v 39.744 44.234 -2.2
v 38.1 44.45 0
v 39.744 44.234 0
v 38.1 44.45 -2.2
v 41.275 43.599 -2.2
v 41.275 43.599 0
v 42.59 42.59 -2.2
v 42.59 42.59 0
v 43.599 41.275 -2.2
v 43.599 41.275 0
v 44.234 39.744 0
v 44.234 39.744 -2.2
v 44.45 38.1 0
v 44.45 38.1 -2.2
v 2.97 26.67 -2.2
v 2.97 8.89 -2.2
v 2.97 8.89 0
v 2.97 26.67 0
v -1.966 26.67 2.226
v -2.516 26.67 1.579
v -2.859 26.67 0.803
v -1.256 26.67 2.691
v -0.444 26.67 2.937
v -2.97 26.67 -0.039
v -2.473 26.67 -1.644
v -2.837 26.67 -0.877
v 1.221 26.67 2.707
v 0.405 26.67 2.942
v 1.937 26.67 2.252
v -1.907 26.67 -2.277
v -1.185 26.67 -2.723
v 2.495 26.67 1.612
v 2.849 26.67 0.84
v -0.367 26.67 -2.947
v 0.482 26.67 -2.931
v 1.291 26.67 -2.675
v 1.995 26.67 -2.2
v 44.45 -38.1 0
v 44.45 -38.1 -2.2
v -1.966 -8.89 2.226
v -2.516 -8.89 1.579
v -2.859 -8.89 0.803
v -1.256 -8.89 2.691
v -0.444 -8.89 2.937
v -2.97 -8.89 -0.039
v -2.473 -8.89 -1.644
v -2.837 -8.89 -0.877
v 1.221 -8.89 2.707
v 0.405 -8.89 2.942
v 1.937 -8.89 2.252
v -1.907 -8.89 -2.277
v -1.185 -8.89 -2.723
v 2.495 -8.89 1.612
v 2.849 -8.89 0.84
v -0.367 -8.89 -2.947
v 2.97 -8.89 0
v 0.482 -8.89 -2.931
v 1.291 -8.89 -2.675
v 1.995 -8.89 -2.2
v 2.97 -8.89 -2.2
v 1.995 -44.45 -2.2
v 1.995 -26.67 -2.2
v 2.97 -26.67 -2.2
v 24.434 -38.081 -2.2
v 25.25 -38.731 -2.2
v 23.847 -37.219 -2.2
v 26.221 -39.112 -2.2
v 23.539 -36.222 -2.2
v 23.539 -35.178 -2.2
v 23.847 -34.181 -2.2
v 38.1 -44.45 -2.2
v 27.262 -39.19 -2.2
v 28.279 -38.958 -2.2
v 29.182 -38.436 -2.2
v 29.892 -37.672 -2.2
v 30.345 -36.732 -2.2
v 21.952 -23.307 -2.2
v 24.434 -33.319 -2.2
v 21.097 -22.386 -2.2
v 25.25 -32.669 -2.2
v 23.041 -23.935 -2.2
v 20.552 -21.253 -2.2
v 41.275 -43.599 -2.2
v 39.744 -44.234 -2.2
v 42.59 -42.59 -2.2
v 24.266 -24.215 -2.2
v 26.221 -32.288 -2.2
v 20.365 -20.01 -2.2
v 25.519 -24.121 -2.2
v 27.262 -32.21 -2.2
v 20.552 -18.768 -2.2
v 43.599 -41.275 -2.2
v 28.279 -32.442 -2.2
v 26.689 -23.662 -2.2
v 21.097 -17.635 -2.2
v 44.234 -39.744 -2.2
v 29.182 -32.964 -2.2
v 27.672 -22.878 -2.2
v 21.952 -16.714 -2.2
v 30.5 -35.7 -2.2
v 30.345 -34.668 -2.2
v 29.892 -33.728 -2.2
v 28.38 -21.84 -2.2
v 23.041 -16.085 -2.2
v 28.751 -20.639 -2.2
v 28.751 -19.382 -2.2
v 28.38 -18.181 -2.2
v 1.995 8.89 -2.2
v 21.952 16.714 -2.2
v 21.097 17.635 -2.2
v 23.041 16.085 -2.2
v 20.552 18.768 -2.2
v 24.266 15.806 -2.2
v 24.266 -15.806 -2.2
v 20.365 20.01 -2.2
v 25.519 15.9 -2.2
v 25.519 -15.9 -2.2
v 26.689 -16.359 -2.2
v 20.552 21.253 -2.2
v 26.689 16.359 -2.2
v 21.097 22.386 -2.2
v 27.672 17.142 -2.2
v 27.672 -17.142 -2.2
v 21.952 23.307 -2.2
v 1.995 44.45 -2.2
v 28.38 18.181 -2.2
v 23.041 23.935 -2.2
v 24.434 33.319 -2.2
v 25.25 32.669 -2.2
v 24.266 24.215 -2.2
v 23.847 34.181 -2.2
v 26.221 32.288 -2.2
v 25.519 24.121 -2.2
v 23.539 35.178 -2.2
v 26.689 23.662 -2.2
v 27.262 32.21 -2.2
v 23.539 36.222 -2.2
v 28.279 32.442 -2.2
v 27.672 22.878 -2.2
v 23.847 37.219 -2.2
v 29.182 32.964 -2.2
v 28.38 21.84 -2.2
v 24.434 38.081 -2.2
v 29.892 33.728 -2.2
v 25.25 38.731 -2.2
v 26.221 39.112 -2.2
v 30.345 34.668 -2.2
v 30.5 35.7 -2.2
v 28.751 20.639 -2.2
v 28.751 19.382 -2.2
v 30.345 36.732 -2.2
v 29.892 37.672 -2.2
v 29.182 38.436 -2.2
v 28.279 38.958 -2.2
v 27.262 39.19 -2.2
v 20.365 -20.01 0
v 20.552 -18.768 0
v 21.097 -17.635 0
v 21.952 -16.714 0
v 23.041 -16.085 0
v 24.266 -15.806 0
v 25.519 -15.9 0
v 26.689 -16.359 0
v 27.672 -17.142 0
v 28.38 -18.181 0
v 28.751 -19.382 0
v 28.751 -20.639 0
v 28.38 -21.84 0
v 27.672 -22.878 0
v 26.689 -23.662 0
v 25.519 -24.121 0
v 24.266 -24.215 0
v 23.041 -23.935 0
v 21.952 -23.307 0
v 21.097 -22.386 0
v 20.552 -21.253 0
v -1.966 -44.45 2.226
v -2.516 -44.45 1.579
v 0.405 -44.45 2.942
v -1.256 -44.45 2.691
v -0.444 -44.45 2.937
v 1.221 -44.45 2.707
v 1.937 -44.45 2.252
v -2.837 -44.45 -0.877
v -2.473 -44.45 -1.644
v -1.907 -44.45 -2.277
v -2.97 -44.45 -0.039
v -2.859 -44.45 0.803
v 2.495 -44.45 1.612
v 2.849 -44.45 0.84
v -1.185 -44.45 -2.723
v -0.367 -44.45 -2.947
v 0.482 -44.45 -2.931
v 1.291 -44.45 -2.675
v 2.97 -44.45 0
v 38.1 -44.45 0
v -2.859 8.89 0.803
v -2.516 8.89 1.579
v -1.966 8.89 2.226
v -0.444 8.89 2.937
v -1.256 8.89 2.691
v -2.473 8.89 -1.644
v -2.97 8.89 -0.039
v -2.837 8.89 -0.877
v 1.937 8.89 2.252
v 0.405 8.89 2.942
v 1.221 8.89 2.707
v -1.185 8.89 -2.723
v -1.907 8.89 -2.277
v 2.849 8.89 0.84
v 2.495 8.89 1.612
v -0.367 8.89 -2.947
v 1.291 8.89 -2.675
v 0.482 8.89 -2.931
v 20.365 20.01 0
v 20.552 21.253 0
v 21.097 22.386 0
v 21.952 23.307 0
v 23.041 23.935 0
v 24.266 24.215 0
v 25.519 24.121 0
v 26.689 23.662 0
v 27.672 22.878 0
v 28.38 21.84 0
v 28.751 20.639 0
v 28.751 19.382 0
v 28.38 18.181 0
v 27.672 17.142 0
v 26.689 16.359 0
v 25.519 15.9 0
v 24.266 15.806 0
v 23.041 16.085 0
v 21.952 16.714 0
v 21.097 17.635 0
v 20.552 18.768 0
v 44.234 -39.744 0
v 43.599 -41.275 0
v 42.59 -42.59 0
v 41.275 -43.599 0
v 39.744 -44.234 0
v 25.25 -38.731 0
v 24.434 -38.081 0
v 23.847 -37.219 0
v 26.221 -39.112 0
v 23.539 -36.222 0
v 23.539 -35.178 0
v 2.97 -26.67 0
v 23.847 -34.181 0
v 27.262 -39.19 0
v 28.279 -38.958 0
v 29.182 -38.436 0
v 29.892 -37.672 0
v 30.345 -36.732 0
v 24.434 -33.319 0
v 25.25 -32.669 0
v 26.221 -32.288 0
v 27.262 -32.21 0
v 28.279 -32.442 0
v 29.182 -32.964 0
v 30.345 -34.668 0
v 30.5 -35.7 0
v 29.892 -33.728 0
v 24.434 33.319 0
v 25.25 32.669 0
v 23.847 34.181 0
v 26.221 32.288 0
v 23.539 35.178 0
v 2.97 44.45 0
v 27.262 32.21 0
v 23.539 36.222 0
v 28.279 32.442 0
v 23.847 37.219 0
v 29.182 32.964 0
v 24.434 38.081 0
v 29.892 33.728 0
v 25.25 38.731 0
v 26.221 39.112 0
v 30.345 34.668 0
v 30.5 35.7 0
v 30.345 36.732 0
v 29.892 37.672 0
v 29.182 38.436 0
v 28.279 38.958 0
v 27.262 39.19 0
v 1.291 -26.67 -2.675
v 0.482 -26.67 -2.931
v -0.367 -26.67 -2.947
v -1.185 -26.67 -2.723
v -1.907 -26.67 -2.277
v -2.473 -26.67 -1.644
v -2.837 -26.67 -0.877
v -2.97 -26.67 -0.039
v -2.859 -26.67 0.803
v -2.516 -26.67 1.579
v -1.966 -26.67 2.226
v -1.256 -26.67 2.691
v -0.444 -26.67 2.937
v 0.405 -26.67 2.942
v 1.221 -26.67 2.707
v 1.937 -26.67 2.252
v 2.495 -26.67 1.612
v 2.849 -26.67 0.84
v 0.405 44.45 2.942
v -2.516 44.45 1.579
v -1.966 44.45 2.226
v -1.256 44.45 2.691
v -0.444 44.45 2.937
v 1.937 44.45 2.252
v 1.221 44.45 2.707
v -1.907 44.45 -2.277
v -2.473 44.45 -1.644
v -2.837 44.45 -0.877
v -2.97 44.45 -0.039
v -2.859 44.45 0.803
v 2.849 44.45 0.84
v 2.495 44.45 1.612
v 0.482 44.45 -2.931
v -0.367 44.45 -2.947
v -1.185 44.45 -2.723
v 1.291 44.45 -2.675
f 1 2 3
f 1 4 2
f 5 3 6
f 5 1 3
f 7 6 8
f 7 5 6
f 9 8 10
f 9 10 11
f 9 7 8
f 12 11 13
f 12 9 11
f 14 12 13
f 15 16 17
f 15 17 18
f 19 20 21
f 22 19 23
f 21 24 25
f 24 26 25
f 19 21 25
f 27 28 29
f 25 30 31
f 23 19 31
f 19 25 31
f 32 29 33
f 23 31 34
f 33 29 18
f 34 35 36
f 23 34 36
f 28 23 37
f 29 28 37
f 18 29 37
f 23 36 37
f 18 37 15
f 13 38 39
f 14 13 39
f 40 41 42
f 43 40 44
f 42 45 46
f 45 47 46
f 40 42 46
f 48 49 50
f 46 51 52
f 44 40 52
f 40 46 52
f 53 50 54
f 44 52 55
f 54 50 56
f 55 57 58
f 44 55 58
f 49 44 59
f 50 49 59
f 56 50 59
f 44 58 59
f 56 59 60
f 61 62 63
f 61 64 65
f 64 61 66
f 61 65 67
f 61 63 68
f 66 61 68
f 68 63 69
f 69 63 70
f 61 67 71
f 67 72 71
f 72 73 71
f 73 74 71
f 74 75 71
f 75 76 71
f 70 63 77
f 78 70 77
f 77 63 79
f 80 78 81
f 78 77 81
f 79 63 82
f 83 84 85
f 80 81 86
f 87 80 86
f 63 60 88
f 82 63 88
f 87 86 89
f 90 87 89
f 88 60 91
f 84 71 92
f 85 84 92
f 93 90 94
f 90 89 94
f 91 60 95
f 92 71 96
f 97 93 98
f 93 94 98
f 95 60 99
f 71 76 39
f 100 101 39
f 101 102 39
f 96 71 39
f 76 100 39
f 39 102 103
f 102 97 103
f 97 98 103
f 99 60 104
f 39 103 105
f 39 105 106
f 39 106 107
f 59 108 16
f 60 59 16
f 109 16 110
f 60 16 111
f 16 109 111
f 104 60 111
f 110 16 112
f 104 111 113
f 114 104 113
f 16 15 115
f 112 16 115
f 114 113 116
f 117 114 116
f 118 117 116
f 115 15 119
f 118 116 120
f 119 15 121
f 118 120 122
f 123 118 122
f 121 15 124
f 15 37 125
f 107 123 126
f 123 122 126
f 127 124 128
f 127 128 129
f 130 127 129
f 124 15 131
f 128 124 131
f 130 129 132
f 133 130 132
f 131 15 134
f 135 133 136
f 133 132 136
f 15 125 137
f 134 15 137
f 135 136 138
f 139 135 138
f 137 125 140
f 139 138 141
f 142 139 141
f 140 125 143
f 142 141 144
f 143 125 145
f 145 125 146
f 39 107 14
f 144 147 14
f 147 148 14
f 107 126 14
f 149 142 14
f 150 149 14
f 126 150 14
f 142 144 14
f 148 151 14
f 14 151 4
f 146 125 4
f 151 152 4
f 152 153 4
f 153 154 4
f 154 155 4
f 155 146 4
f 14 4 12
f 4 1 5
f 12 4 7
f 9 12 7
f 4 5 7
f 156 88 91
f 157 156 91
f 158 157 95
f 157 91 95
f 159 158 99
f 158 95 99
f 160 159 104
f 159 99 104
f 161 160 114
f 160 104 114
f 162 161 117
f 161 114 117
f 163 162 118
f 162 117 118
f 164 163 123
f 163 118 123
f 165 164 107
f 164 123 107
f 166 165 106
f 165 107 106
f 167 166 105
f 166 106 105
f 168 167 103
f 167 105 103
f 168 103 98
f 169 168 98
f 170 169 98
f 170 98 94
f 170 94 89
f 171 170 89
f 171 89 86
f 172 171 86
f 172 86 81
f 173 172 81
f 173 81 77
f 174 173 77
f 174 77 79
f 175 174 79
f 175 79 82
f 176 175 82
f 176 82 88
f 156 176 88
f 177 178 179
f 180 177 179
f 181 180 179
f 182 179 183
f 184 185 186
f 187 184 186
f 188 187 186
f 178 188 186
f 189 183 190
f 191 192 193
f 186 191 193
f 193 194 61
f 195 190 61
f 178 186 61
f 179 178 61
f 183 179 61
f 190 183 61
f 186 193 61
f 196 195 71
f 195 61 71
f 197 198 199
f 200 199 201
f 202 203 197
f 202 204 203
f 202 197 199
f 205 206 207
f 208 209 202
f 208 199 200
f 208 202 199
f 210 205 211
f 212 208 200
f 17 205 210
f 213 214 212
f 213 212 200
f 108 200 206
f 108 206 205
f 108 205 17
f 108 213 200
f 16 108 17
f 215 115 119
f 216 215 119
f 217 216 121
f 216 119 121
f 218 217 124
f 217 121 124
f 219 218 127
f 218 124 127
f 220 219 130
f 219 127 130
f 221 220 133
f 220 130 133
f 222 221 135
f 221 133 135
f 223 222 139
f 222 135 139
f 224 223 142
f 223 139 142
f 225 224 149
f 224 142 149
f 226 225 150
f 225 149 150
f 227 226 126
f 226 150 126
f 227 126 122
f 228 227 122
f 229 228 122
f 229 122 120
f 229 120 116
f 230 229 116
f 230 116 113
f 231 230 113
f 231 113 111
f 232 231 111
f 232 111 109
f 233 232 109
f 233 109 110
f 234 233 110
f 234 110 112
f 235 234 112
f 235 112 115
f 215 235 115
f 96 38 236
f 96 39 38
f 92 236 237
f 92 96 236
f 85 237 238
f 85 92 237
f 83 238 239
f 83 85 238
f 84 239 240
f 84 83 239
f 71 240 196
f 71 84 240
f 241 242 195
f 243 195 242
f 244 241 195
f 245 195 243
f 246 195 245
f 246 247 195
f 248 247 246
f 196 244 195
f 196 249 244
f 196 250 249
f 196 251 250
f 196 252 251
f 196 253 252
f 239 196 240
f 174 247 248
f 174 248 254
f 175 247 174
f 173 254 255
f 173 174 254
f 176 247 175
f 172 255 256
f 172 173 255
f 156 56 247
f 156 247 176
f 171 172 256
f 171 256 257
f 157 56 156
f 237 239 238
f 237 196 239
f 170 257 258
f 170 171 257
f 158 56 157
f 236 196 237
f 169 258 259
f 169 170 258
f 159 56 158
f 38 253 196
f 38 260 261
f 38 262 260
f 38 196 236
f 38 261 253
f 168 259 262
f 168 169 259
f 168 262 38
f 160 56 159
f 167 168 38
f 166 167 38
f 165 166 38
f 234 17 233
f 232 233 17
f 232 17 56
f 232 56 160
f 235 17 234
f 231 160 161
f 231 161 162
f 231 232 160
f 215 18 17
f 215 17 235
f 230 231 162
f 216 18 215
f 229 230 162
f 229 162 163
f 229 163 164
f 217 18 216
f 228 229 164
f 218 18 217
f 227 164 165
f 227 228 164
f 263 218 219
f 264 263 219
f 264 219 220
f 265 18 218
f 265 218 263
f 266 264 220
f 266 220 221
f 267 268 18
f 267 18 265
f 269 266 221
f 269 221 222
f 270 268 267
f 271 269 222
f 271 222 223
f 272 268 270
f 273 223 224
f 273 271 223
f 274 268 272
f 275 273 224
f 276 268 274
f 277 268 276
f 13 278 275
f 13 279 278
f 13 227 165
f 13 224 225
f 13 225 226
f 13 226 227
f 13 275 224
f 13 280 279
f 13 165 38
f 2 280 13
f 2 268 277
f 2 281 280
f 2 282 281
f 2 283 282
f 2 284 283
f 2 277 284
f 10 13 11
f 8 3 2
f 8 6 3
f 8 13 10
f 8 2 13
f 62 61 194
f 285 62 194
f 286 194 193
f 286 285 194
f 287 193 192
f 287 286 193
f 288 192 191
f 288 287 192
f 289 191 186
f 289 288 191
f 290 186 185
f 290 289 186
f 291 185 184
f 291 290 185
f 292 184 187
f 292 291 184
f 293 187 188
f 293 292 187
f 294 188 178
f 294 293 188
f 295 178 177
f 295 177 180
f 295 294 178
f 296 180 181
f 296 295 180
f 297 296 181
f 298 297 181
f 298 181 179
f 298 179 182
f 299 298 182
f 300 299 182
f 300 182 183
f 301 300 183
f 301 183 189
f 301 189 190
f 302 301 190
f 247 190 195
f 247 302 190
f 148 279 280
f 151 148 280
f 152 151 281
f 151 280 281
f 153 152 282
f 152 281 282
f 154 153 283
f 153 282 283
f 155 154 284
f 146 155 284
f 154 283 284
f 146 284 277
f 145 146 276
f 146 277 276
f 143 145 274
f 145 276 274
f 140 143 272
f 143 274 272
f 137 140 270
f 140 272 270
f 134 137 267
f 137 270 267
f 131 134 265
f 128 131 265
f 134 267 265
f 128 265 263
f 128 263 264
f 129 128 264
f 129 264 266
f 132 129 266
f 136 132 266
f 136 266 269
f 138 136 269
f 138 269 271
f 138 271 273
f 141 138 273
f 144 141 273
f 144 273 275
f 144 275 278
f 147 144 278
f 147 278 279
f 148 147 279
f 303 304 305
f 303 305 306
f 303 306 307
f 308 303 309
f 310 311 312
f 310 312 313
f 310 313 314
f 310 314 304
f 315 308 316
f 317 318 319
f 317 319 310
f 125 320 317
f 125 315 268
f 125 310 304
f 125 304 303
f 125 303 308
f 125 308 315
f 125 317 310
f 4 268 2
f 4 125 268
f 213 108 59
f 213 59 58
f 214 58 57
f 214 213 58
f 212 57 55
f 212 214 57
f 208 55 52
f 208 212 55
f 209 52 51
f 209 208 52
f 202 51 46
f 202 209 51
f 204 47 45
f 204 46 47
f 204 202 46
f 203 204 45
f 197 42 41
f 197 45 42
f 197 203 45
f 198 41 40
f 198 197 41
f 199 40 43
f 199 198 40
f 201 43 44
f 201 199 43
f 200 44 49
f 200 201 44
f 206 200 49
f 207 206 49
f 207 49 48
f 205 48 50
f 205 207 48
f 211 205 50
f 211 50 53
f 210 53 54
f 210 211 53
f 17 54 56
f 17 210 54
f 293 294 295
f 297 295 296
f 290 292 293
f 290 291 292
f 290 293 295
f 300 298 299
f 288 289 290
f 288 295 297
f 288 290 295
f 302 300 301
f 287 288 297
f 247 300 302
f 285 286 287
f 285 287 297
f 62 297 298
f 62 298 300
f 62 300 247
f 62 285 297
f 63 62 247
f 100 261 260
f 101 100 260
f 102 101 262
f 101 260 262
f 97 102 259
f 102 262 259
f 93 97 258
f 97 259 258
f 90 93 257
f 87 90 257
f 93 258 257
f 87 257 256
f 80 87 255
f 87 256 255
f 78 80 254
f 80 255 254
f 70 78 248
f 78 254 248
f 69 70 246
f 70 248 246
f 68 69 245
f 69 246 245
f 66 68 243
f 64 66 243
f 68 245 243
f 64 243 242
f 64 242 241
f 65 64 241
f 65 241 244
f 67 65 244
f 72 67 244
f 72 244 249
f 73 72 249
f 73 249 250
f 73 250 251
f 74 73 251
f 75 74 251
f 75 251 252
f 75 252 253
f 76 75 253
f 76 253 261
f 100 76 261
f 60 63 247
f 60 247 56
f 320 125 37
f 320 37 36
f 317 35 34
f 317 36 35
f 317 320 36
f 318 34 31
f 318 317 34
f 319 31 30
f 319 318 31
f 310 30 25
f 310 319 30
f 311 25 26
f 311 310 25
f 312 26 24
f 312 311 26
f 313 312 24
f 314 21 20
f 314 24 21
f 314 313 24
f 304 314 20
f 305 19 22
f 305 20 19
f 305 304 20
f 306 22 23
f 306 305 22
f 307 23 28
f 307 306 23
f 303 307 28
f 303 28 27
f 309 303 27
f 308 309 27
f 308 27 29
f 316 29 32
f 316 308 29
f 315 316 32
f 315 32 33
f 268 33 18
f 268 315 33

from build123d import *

# Parameters (mm, degrees)
SKETCH1_R                = 2.97
SKETCH1_W                = 44.45
SKETCH1_H                = 2.2
BOSS_EXTRUDE1_DEPTH      = 44.45
CUT_EXTRUDE1_DEPTH       = 63.931914797
CUT_EXTRUDE1_DEPTH_BACK  = 63.931914797
SKETCH2_W                = 5.94
SKETCH2_H                = 17.78
FILLET1_R                = 6.35
SKETCH4_R                = 3.5
CUT_EXTRUDE2_DEPTH       = 63.931914797
F_5_16_CLEARANCE_HOLE1_D = 8.4328


with BuildPart() as part:
    # Sketch1 → Boss-Extrude1 (new, symmetric)
    with BuildSketch(Plane(origin=(0, 0, 0), x_dir=(1, 0, 0), z_dir=(0, 1, 0))):
        Circle(SKETCH1_R)
        with Locations((22.225, 1.1)):
            Rectangle(SKETCH1_W, SKETCH1_H)
    extrude(amount=BOSS_EXTRUDE1_DEPTH, both=True)

    # Sketch2 → Cut-Extrude1 (cut, two sides: drawn at the far end of the back side and taken through both)
    with BuildSketch(Plane.XY.offset(-CUT_EXTRUDE1_DEPTH_BACK)):
        with Locations((0, 17.78)):
            Rectangle(SKETCH2_W, SKETCH2_H)
        with Locations((0, -17.78)):
            Rectangle(SKETCH2_W, SKETCH2_H)
    extrude(amount=CUT_EXTRUDE1_DEPTH + CUT_EXTRUDE1_DEPTH_BACK, mode=Mode.SUBTRACT)

    # Fillet1
    fillet1_edges = [part.edges().sort_by_distance(p)[0] for p in [
        (44.45, 44.45, -1.1),
        (44.45, -44.45, -1.1),
    ]]
    fillet(fillet1_edges, radius=FILLET1_R)

    # Sketch4 → Cut-Extrude2 (cut, through all)
    with BuildSketch(Plane.XY):
        with Locations((27, 35.7)):
            Circle(SKETCH4_R)
        with Locations((27, -35.7)):
            Circle(SKETCH4_R)
    extrude(amount=-CUT_EXTRUDE2_DEPTH, mode=Mode.SUBTRACT)

    # 5/16 Clearance Hole1 (through all)
    with Locations(Plane.XY):
        with Locations((24.58125, 20.010345019), (24.58125, -20.010345019)):
            Hole(F_5_16_CLEARANCE_HOLE1_D / 2)


solid = part.part
